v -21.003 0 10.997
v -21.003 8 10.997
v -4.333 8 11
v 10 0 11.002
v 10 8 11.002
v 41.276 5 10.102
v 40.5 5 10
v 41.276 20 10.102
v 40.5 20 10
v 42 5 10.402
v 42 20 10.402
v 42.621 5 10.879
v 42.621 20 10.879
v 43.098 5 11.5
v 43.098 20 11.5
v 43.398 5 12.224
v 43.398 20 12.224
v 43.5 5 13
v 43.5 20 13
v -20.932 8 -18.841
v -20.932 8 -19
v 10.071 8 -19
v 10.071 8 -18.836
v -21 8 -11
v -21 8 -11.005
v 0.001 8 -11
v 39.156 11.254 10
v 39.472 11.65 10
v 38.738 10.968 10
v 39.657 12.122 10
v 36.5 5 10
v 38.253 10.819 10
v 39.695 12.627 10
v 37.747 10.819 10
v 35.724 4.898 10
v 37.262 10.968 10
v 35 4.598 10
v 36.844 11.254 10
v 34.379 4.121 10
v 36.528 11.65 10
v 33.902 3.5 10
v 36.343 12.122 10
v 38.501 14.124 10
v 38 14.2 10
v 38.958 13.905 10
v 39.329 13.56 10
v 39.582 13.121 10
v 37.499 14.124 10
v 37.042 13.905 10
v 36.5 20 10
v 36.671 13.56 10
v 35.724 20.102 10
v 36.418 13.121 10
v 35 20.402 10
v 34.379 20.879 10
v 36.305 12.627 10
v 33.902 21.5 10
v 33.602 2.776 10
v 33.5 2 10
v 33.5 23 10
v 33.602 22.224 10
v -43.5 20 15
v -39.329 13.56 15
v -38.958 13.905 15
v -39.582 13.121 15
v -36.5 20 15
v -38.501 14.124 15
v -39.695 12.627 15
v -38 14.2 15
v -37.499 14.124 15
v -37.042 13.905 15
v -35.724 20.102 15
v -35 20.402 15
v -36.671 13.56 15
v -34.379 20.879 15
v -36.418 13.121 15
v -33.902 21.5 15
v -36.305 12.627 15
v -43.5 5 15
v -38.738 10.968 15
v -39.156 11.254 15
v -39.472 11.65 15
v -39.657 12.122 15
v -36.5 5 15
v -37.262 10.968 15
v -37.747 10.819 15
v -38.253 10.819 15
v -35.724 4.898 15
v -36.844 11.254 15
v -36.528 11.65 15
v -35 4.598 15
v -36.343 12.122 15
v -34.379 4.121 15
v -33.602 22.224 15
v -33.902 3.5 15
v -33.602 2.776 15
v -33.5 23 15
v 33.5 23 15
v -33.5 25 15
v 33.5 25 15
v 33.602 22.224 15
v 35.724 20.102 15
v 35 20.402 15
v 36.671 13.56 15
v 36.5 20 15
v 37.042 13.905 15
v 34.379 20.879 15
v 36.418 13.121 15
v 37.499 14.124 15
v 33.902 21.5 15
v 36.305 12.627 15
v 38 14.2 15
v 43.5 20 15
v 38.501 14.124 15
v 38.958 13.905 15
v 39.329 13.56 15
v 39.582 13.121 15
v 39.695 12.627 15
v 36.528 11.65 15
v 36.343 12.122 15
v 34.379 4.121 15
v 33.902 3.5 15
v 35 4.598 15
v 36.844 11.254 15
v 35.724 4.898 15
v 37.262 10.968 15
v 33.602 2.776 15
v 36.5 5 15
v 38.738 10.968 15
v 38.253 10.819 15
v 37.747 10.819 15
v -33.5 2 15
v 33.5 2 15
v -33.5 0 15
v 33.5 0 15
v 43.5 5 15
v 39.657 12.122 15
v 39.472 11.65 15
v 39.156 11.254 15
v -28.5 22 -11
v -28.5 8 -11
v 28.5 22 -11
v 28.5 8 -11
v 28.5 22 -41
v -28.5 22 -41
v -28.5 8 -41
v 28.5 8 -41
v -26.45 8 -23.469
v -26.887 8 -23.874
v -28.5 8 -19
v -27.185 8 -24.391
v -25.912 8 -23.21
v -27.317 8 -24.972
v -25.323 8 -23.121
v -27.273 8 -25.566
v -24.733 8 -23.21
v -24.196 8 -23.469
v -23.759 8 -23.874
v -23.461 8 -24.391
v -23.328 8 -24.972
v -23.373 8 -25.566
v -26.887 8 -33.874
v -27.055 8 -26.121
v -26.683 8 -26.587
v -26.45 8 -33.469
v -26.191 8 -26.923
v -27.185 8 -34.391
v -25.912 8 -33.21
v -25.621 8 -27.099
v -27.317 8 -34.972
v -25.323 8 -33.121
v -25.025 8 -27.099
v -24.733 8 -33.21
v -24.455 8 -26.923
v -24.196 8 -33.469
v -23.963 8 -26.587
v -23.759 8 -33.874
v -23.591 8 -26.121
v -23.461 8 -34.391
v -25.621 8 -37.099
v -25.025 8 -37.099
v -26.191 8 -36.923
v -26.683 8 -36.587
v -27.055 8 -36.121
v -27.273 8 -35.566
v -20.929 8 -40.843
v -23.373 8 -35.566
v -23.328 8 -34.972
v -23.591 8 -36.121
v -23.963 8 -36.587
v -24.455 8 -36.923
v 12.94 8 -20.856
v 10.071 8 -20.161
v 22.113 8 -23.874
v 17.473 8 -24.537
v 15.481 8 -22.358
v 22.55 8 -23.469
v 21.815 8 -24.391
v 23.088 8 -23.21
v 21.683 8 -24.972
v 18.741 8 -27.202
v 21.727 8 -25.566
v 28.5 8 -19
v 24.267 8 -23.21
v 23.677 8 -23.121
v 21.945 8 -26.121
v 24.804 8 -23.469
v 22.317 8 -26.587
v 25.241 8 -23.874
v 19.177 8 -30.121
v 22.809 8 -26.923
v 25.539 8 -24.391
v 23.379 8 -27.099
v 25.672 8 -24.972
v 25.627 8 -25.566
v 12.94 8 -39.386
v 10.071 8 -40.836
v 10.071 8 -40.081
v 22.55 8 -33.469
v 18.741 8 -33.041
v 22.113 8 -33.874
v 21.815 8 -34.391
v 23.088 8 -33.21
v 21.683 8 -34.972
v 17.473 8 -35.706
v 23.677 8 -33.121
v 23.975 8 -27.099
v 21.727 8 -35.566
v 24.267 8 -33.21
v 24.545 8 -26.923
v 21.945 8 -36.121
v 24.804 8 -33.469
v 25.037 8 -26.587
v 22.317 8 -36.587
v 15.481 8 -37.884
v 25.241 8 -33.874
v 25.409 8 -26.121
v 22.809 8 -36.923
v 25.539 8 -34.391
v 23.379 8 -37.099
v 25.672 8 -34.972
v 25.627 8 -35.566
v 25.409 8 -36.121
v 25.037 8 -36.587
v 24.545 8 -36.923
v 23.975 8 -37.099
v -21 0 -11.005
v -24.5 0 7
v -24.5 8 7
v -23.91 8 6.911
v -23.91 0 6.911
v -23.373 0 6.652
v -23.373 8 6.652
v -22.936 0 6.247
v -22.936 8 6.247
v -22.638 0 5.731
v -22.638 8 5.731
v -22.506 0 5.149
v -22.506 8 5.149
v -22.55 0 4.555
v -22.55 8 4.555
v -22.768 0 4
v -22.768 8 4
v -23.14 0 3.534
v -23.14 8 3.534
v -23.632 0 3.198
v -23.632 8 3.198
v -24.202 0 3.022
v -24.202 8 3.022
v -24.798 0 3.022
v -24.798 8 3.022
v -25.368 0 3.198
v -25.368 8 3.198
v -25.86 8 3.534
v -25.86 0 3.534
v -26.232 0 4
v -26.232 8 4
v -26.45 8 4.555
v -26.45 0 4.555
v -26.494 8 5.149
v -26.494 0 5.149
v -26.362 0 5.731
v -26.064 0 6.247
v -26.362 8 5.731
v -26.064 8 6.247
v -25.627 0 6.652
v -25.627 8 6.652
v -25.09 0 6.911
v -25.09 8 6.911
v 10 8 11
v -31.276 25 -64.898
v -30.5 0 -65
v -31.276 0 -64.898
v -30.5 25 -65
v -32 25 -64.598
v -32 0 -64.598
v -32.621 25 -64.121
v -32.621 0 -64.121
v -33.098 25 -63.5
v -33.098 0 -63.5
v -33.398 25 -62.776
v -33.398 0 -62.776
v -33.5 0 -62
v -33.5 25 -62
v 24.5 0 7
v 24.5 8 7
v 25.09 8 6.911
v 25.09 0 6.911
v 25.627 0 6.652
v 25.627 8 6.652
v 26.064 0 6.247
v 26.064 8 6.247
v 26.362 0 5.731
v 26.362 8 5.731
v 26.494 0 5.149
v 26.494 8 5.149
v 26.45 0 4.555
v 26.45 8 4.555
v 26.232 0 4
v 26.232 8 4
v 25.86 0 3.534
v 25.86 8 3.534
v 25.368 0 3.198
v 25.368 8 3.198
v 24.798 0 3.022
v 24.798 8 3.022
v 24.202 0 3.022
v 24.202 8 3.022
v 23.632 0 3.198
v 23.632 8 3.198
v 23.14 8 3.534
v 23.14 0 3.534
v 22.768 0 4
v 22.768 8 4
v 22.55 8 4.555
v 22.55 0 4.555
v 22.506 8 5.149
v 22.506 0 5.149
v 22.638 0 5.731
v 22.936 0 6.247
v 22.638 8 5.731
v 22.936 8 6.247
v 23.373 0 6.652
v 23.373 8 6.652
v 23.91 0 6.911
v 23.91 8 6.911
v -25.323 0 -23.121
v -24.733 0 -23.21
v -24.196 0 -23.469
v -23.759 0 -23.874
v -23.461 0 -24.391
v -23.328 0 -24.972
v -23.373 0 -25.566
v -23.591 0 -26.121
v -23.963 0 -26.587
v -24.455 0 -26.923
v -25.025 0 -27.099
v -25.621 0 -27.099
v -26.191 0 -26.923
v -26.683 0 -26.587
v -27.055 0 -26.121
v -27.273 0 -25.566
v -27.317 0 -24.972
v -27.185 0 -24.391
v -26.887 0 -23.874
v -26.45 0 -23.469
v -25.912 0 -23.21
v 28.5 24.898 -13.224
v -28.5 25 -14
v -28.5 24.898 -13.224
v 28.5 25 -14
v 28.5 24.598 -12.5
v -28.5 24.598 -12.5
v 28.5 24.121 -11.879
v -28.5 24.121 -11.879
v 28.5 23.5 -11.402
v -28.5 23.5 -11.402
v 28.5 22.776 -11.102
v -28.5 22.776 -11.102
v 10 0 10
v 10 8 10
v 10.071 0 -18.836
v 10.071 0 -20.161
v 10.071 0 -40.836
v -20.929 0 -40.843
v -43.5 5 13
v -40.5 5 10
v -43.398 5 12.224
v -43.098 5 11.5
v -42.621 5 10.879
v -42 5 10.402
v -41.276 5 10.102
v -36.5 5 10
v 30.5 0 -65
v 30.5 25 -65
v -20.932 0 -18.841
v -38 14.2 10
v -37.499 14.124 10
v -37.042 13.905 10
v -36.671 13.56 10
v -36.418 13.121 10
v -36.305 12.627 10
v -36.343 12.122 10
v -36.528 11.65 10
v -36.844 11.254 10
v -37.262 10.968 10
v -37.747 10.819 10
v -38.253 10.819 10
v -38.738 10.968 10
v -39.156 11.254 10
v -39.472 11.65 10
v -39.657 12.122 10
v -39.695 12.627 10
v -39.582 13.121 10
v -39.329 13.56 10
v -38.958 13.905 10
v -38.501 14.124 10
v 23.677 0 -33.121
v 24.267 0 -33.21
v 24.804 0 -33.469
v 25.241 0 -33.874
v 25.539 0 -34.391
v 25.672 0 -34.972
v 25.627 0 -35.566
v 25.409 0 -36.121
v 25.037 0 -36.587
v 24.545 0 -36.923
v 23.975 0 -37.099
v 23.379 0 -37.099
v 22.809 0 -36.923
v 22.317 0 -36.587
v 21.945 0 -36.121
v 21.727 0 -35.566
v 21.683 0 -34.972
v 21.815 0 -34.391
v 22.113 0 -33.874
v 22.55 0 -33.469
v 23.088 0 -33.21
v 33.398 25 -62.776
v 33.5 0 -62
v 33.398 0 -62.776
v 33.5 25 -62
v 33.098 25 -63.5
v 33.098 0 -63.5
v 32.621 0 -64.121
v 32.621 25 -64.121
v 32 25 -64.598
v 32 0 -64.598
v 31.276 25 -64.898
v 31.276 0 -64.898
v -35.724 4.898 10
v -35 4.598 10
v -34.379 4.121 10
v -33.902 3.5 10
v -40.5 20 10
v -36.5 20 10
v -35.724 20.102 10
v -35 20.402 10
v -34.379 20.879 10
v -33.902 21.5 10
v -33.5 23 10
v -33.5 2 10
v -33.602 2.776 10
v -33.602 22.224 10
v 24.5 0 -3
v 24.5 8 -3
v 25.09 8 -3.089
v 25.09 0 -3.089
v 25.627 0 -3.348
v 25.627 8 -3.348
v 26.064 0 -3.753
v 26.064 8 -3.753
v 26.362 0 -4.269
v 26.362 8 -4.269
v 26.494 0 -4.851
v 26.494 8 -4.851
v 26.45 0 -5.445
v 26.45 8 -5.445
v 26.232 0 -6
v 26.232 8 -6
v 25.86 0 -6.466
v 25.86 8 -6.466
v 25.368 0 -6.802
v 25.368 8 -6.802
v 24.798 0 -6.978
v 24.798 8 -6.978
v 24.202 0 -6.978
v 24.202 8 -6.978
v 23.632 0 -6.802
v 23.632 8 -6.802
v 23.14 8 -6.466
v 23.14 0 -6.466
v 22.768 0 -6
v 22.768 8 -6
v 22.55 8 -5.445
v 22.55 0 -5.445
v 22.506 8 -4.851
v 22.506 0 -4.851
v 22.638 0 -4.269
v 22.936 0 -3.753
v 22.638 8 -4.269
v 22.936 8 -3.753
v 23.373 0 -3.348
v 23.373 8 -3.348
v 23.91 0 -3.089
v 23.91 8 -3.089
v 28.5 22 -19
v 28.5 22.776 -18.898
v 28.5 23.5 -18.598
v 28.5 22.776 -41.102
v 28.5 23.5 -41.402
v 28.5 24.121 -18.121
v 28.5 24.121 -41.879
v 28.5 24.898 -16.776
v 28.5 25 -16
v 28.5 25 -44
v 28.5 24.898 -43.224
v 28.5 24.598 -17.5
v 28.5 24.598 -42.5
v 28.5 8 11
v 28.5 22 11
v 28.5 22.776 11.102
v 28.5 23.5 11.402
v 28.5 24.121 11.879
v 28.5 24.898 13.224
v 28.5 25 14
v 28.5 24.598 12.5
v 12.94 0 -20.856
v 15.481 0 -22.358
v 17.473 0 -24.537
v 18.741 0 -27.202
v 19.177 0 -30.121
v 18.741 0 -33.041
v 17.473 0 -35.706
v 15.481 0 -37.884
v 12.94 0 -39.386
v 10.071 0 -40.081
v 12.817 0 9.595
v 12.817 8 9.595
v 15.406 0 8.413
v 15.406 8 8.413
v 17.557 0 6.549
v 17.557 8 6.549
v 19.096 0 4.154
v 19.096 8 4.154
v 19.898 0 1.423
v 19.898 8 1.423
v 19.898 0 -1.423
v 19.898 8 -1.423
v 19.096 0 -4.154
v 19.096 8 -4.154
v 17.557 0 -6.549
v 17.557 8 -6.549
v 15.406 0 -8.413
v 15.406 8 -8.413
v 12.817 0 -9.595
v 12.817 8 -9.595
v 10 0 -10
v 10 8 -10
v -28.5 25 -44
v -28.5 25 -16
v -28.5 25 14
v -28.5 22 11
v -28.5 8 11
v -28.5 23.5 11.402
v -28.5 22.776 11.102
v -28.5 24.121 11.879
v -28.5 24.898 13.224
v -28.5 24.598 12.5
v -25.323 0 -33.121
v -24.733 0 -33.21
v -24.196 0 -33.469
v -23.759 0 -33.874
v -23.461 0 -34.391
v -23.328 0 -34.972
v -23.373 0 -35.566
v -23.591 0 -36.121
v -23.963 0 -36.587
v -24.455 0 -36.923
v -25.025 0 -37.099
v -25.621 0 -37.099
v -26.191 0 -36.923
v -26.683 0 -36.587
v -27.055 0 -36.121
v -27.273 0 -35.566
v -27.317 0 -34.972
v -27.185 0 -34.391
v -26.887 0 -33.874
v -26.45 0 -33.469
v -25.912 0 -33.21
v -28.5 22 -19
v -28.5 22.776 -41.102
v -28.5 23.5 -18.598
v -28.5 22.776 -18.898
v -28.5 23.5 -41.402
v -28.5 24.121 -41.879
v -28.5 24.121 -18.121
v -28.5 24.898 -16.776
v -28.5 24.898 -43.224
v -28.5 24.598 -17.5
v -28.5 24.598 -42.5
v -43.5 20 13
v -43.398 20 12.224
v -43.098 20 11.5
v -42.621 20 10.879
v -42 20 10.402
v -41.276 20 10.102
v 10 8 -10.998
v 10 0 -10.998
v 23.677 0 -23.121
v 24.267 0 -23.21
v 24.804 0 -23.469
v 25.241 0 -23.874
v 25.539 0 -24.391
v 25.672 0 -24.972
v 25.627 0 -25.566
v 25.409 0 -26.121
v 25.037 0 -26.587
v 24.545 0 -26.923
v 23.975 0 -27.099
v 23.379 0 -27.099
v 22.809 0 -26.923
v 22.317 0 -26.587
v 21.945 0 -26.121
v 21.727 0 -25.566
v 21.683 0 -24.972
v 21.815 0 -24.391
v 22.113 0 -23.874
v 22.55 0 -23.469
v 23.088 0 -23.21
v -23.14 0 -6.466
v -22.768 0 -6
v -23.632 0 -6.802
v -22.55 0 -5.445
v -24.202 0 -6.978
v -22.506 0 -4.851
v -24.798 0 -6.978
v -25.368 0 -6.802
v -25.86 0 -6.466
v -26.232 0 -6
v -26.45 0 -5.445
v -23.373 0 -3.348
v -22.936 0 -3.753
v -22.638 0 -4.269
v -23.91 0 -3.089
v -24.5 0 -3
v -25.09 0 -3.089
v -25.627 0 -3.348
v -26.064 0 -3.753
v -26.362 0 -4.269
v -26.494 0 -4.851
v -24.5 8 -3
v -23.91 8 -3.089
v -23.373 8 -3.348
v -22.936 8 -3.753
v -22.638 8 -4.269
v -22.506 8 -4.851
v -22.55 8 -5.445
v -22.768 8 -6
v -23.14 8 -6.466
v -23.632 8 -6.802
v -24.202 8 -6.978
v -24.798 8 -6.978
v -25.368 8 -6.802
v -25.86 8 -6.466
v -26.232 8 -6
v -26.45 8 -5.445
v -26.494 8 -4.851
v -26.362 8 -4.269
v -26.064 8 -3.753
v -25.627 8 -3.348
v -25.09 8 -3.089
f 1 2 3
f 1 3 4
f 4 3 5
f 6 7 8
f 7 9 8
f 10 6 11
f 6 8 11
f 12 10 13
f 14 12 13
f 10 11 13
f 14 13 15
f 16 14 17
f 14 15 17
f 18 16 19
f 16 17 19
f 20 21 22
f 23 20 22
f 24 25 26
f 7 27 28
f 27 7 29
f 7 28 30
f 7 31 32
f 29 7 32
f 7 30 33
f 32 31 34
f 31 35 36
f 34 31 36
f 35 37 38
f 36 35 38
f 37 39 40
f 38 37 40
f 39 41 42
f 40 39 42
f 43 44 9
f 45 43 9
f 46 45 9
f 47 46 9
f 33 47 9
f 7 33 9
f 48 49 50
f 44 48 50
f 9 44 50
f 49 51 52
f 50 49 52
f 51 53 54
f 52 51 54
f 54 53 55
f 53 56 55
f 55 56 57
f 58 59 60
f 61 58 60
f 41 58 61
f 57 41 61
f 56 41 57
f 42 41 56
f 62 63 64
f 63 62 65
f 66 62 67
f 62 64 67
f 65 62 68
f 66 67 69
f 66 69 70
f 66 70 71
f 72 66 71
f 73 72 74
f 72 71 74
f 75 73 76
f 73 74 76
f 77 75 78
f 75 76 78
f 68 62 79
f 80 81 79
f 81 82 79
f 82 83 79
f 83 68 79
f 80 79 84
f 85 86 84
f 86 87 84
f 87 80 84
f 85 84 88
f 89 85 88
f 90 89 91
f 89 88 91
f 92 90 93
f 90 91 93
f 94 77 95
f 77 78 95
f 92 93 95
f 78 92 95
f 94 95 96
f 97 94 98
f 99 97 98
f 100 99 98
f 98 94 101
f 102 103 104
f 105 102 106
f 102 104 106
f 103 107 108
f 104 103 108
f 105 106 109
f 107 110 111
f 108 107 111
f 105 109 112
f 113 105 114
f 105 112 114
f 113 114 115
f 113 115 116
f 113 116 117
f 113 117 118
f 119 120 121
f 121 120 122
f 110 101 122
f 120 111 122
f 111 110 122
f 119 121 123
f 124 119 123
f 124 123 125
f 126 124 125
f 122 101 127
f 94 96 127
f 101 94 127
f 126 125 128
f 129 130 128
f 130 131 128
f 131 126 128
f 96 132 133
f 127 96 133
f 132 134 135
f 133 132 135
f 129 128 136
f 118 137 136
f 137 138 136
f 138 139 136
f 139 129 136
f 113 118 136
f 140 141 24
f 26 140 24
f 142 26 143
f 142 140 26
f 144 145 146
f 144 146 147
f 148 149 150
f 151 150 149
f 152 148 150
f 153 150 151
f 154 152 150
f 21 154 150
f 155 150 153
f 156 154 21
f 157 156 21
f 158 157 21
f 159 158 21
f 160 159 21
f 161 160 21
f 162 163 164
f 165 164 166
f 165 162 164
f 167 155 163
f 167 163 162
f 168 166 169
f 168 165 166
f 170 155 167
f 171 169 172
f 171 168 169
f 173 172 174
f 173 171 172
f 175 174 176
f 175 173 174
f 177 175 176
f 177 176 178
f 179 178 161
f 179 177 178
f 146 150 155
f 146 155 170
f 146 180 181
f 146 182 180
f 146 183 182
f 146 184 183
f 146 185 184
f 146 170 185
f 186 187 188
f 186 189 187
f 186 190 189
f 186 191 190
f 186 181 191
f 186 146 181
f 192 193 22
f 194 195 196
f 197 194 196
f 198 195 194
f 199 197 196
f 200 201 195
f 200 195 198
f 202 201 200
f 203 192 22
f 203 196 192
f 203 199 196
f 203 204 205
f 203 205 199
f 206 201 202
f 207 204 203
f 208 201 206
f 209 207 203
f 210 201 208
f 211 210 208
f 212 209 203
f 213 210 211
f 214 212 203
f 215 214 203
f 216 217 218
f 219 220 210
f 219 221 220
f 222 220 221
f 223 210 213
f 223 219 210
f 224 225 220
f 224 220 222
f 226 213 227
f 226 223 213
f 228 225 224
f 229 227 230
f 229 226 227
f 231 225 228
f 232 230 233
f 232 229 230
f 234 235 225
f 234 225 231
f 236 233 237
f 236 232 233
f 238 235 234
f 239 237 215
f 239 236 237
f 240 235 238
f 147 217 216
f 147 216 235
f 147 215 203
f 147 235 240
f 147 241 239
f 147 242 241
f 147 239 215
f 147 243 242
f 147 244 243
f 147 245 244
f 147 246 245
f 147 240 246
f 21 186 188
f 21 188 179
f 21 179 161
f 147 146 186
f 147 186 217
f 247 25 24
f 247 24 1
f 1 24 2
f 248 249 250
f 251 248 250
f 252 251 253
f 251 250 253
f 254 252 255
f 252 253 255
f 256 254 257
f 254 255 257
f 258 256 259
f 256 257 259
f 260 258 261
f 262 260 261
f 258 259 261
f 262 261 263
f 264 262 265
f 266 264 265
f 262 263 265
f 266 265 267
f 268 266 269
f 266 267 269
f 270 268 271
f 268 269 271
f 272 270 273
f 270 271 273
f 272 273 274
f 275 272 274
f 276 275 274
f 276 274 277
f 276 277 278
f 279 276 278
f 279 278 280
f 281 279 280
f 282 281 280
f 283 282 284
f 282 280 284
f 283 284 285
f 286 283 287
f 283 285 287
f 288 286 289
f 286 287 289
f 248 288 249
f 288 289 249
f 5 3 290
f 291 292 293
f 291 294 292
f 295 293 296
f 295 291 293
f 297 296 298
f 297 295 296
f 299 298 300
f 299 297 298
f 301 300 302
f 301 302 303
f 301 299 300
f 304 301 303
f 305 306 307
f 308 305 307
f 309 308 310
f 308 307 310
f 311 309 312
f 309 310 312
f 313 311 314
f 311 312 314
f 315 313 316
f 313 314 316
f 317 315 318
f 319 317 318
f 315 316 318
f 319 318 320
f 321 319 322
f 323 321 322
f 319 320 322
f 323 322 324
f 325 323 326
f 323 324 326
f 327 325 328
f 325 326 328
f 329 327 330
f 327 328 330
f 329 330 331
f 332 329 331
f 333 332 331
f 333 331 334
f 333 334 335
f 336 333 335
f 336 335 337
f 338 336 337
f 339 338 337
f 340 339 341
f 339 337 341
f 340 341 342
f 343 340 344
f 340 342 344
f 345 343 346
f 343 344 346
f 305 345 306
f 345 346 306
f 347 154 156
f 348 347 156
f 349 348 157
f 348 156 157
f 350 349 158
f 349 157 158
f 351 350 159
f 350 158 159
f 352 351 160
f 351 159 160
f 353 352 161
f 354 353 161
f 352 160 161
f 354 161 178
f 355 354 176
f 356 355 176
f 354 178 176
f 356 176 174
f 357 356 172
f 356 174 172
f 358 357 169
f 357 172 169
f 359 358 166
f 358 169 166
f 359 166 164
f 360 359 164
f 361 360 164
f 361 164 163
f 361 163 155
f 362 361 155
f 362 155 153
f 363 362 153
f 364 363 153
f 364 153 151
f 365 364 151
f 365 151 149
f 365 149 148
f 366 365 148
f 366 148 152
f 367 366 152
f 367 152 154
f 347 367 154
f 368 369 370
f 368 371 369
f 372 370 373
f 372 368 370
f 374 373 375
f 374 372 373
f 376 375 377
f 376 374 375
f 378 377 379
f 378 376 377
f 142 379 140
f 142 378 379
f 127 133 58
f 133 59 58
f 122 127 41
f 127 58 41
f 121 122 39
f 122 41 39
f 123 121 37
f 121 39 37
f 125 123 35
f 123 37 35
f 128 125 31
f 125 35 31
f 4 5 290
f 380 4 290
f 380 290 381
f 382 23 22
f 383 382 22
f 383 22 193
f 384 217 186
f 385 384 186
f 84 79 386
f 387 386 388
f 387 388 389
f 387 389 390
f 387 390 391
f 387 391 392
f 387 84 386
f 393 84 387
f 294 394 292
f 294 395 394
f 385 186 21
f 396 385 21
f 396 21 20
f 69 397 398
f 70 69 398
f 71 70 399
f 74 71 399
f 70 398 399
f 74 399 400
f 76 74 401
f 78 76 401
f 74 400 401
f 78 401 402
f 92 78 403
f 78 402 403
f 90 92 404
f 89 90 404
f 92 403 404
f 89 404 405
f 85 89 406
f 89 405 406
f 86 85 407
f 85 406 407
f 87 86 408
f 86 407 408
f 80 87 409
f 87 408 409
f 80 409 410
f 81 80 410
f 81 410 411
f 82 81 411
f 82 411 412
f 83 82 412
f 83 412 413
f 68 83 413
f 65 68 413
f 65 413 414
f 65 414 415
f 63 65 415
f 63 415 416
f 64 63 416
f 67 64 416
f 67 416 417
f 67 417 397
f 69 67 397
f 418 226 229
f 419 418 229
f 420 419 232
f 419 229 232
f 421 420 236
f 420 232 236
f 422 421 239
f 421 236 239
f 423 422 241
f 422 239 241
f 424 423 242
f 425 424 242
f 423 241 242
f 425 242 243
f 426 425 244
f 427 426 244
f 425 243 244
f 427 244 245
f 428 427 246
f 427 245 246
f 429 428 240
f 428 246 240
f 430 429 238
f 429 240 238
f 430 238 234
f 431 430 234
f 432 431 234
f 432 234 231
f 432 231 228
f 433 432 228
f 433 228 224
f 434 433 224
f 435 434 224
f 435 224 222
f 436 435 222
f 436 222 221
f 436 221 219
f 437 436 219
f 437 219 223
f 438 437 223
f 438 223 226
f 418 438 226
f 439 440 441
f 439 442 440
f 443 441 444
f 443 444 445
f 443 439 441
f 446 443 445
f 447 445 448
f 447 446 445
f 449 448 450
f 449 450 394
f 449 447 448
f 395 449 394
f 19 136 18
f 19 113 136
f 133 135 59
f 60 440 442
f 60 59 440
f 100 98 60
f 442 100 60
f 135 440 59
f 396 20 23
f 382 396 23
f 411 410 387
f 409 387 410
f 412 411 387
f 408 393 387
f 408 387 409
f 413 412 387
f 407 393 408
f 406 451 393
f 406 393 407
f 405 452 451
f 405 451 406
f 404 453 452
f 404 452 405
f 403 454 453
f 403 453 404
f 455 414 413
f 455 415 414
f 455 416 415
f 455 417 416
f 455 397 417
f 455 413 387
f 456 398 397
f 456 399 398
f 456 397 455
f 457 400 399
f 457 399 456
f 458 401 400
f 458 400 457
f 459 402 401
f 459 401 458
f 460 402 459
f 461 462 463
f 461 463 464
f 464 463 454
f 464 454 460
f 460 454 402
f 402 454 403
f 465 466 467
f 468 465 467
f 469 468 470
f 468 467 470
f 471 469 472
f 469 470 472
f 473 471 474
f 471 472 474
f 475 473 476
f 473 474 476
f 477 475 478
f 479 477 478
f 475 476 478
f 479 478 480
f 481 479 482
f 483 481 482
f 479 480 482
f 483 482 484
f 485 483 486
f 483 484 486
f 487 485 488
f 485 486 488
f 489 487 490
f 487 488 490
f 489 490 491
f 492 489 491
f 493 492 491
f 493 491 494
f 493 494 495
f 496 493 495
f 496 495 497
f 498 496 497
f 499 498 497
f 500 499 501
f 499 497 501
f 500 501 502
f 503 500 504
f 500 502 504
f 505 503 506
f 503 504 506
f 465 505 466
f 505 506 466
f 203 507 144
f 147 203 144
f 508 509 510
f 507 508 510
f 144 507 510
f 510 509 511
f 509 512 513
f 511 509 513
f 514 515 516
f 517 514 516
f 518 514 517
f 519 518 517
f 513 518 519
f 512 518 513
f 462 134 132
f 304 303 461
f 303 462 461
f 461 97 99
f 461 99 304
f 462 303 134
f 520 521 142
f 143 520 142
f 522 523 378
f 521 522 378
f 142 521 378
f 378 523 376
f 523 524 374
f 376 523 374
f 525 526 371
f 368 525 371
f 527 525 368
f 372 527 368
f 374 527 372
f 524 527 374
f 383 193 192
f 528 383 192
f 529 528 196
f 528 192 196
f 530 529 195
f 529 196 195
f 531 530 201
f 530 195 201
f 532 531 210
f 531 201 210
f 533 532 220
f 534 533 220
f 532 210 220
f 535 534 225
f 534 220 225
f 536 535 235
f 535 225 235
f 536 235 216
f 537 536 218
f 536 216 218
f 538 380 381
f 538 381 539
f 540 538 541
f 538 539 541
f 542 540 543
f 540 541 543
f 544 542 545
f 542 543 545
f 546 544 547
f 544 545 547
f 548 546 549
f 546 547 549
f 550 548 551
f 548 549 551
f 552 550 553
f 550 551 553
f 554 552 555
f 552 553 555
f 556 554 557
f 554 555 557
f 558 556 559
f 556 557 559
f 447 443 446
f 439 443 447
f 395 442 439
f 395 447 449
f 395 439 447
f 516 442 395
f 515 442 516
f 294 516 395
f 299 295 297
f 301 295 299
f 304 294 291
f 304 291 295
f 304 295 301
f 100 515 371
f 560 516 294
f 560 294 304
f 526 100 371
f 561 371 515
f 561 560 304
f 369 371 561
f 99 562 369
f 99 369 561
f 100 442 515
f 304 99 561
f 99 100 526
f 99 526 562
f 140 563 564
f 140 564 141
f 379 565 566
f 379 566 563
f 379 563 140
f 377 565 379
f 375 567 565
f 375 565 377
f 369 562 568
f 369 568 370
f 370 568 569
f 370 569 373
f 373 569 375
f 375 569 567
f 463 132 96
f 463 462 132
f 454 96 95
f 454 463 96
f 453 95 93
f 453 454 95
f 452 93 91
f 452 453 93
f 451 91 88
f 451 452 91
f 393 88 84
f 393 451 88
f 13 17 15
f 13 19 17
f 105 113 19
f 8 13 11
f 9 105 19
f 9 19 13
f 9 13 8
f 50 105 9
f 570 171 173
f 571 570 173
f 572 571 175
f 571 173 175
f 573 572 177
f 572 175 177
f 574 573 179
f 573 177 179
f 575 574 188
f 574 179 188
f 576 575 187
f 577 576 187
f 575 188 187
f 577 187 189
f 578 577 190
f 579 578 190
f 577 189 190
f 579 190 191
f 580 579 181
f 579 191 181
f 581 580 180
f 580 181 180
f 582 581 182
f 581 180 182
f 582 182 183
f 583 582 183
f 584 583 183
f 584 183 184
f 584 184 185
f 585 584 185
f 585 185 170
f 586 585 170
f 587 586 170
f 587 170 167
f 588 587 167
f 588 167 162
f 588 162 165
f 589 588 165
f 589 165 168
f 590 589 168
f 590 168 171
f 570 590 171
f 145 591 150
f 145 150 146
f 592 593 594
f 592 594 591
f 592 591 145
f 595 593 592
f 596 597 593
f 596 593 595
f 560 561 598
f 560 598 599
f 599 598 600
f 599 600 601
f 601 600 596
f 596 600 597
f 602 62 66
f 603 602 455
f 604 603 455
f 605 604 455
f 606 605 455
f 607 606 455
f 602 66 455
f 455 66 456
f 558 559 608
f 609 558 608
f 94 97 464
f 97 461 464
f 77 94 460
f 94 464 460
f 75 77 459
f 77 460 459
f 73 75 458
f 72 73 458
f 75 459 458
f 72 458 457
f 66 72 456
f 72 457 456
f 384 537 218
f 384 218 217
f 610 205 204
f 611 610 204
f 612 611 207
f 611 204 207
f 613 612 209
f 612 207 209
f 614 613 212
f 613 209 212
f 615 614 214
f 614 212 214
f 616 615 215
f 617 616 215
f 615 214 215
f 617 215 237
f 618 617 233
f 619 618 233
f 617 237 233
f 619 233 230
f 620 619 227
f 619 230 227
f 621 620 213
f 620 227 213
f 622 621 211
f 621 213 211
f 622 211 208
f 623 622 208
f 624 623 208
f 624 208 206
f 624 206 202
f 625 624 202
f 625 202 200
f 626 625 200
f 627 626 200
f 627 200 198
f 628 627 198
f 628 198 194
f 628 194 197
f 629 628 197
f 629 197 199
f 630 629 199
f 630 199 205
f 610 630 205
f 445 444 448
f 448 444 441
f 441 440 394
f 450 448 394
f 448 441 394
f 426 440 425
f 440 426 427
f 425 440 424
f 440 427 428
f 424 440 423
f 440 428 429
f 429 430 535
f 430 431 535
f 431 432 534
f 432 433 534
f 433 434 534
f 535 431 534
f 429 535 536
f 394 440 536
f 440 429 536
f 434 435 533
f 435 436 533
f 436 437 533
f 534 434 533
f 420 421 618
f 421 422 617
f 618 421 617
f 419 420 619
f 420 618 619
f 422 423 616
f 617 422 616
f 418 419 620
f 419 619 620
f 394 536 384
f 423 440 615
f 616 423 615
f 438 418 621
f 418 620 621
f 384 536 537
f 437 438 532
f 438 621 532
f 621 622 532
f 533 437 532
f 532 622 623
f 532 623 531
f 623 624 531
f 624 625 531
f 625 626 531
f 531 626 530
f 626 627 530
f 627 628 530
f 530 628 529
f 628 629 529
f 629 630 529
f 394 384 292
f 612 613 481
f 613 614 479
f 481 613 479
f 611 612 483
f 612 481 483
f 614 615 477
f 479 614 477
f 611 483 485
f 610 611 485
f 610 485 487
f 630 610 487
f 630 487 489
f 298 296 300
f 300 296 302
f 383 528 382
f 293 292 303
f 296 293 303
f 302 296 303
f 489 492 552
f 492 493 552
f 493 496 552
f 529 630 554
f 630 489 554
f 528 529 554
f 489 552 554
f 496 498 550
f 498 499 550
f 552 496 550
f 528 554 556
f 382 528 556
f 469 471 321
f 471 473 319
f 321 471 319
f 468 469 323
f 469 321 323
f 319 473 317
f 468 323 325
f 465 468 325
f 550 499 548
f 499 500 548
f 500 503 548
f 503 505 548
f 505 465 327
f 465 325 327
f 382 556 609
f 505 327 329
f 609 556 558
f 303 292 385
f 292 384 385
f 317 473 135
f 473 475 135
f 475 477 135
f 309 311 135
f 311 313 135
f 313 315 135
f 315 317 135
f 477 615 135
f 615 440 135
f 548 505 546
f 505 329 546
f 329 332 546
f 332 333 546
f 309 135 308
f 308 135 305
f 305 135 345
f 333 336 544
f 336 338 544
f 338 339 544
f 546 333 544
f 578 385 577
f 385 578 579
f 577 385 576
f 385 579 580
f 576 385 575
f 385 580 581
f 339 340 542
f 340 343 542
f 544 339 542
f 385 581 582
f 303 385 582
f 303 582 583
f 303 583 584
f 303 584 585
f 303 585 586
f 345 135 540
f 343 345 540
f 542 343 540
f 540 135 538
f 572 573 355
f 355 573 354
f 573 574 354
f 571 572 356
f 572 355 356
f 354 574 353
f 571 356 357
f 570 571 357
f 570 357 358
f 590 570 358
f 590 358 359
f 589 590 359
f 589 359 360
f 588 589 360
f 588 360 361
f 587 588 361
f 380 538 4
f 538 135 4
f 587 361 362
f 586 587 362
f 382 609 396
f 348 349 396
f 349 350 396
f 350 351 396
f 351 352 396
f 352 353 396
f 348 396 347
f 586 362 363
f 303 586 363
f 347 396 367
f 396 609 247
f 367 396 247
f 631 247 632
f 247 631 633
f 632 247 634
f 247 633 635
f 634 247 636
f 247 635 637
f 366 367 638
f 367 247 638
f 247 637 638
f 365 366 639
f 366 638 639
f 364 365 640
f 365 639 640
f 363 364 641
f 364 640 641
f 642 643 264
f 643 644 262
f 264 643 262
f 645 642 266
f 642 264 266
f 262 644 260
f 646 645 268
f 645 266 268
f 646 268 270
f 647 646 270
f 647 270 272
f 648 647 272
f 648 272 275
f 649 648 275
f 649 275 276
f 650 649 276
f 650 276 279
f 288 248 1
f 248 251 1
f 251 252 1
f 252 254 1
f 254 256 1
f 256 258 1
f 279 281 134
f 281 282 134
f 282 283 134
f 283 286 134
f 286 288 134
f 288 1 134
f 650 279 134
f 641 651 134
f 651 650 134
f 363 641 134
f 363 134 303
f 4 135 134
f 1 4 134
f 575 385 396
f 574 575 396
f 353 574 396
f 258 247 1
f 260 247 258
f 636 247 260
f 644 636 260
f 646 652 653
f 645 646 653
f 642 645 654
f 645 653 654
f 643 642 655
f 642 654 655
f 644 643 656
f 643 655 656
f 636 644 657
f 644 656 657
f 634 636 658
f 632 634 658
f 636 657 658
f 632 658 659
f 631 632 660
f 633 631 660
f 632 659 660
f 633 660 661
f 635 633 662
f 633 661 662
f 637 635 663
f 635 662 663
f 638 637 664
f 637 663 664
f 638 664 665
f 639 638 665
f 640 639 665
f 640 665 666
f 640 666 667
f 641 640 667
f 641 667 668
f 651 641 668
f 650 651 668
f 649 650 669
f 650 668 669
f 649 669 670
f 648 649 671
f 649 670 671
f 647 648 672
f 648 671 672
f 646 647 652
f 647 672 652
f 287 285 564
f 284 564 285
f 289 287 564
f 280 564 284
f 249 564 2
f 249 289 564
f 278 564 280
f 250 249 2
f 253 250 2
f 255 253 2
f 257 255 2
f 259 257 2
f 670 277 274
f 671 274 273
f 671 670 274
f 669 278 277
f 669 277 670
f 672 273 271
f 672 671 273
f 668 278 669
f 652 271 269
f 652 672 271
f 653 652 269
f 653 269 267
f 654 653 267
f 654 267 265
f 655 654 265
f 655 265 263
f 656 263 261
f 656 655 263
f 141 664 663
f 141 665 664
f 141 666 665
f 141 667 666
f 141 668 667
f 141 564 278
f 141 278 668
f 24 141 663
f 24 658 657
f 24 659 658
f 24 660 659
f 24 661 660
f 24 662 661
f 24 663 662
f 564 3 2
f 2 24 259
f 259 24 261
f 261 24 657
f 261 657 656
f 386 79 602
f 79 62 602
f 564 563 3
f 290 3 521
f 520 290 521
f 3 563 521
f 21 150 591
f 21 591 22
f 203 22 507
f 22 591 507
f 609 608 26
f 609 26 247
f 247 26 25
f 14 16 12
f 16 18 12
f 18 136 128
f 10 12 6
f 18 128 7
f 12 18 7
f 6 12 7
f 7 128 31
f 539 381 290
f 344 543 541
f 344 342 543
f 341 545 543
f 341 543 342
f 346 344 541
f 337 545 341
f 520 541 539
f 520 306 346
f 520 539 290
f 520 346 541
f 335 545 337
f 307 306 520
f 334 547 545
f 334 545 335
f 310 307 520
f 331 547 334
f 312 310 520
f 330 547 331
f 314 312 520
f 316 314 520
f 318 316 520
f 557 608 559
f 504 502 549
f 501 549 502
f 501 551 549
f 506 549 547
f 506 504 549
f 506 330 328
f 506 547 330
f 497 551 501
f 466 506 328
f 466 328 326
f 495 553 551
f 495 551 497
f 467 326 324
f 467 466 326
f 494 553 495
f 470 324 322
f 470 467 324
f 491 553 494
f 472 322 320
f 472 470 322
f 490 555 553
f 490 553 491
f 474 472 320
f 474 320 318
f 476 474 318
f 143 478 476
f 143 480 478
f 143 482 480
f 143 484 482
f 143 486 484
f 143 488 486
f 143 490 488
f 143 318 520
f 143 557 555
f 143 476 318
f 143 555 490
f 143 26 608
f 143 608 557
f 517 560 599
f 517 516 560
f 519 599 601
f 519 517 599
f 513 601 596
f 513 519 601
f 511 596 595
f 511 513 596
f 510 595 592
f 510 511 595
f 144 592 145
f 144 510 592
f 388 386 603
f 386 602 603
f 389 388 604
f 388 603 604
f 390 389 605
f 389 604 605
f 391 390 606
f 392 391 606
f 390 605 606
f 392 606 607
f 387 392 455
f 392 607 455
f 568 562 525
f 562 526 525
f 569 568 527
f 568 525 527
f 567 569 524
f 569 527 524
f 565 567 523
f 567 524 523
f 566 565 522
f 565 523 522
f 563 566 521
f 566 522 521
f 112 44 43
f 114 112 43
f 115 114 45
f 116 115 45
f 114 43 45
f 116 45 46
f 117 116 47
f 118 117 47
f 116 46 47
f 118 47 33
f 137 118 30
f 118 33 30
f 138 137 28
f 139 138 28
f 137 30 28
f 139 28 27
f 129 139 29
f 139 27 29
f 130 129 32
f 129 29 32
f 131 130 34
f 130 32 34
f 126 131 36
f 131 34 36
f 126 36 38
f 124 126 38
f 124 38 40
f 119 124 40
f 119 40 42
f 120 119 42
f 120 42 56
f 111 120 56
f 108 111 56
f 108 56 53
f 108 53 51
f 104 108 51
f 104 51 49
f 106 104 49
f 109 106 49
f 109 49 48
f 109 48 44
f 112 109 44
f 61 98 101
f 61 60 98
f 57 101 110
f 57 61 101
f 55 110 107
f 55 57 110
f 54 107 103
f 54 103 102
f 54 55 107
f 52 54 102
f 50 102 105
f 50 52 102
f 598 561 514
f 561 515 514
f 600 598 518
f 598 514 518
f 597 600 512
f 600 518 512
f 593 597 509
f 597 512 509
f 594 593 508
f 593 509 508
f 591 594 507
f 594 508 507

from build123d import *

# Parameters (mm, degrees)
SKETCH1_W           = 67
SKETCH1_H           = 30
BOSS_EXTRUDE1_DEPTH = 25
SKETCH2_W           = 57
SKETCH2_H           = 22
CUT_EXTRUDE1_DEPTH  = 17
SKETCH3_R           = 10
SKETCH3_R_2         = 8
SKETCH3_R_3         = 2
CUT_EXTRUDE2_DEPTH  = 8
BOSS_EXTRUDE2_START = -67
SKETCH4_W           = 5
SKETCH4_H           = 15
BOSS_EXTRUDE2_DEPTH = 10
SKETCH4_2_W         = 5
SKETCH4_2_H         = 15
BOSS_EXTRUDE3_DEPTH = 10
SKETCH5_R           = 1.7
CUT_EXTRUDE3_DEPTH  = 10
CUT_EXTRUDE4_DEPTH  = 8
SKETCH8_W           = 67
SKETCH8_H           = 25
BOSS_EXTRUDE4_DEPTH = 50
SKETCH9_W           = 57
SKETCH9_H           = 22
CUT_EXTRUDE6_DEPTH  = 17
SKETCH11_R          = 10
SKETCH11_R_2        = 8
SKETCH11_R_3        = 2
CUT_EXTRUDE7_DEPTH  = 81.039052968
CUT_EXTRUDE8_DEPTH  = 81.039052968
FILLET1_R           = 3


with BuildPart() as part:
    # Sketch1 → Boss-Extrude1 (new body)
    with BuildSketch(Plane(origin=(0, 0, 0), x_dir=(1, 0, 0), z_dir=(0, 1, 0))):
        Rectangle(SKETCH1_W, SKETCH1_H)
    extrude(amount=BOSS_EXTRUDE1_DEPTH)

    # Sketch2 → Cut-Extrude1 (cut)
    with BuildSketch(Plane(origin=(0, 25, 0), x_dir=(1, 0, 0), z_dir=(0, 1, 0))):
        Rectangle(SKETCH2_W, SKETCH2_H)
    extrude(amount=-CUT_EXTRUDE1_DEPTH, mode=Mode.SUBTRACT)

    # Sketch3 → Cut-Extrude2 (cut)
    with BuildSketch(Plane(origin=(0, 8, 0), x_dir=(1, 0, 0), z_dir=(0, 1, 0))):
        with Locations((10, 0)):
            Circle(SKETCH3_R)
        with Locations((-3, 0)):
            Circle(SKETCH3_R_2)
        with Locations(Location((-24.5, 5, 0), (0, 0, 270))):
            Circle(SKETCH3_R_3)
        with Locations(Location((-24.5, -5, 0), (0, 0, 270))):
            Circle(SKETCH3_R_3)
        with Locations(Location((24.5, 5, 0), (0, 0, 270))):
            Circle(SKETCH3_R_3)
        with Locations(Location((24.5, -5, 0), (0, 0, 270))):
            Circle(SKETCH3_R_3)
    extrude(amount=-CUT_EXTRUDE2_DEPTH, mode=Mode.SUBTRACT)

    # Sketch4 → Boss-Extrude2 (add)
    with BuildSketch(Plane(origin=(33.5, 0, 0), x_dir=(0, 0, -1), z_dir=(1, 0, 0)).offset(BOSS_EXTRUDE2_START)):
        with Locations((-12.5, 12.5)):
            Rectangle(SKETCH4_W, SKETCH4_H)
    extrude(amount=-BOSS_EXTRUDE2_DEPTH)

    # Sketch4<2> → Boss-Extrude3 (add)
    with BuildSketch(Plane(origin=(33.5, 0, 0), x_dir=(0, 0, -1), z_dir=(1, 0, 0))):
        with Locations((-12.5, 12.5)):
            Rectangle(SKETCH4_2_W, SKETCH4_2_H)
    extrude(amount=BOSS_EXTRUDE3_DEPTH)

    # Sketch5 → Cut-Extrude3 (cut)
    with BuildSketch(Plane(origin=(0, 0, 10), x_dir=(-1, 0, 0), z_dir=(0, 0, -1))):
        with Locations(Location((38, 12.5, 0), (0, 0, 90))):
            Circle(SKETCH5_R)
        with Locations(Location((-38, 12.5, 0), (0, 0, 90))):
            Circle(SKETCH5_R)
    extrude(amount=-CUT_EXTRUDE3_DEPTH, mode=Mode.SUBTRACT)

    # Sketch6 → Cut-Extrude4 (cut)
    with BuildSketch(Plane(origin=(0, 8, 0), x_dir=(1, 0, 0), z_dir=(0, 1, 0))):
        Polygon((-21, 11.00455557), (-21.003329437, -10.997477388), (10, -11.002168937), (10, 10.997831063), align=None)
    extrude(amount=-CUT_EXTRUDE4_DEPTH, mode=Mode.SUBTRACT)

    # Sketch8 → Boss-Extrude4 (add)
    with BuildSketch(Plane(origin=(0, 0, -15), x_dir=(-1, 0, 0), z_dir=(0, 0, -1))):
        with Locations((0, 12.5)):
            Rectangle(SKETCH8_W, SKETCH8_H)
    extrude(amount=BOSS_EXTRUDE4_DEPTH)

    # Sketch9 → Cut-Extrude6 (cut)
    with BuildSketch(Plane(origin=(0, 25, 0), x_dir=(1, 0, 0), z_dir=(0, 1, 0))):
        with Locations((0, 30)):
            Rectangle(SKETCH9_W, SKETCH9_H)
    extrude(amount=-CUT_EXTRUDE6_DEPTH, mode=Mode.SUBTRACT)

    # Sketch11 → Cut-Extrude7 (cut, through all)
    with BuildSketch(Plane(origin=(0, 8, 0), x_dir=(1, 0, 0), z_dir=(0, 1, 0))):
        with Locations((9.177125898, 30.121191818)):
            Circle(SKETCH11_R)
        with Locations((-3.822874102, 30.121191818)):
            Circle(SKETCH11_R_2)
        with Locations(Location((-25.322874102, 35.121191818, 0), (0, 0, 270))):
            Circle(SKETCH11_R_3)
        with Locations(Location((-25.322874102, 25.121191818, 0), (0, 0, 270))):
            Circle(SKETCH11_R_3)
        with Locations(Location((23.677125898, 35.121191818, 0), (0, 0, 270))):
            Circle(SKETCH11_R_3)
        with Locations(Location((23.677125898, 25.121191818, 0), (0, 0, 270))):
            Circle(SKETCH11_R_3)
    extrude(amount=-CUT_EXTRUDE7_DEPTH, mode=Mode.SUBTRACT)

    # Sketch13 → Cut-Extrude8 (cut, through all)
    with BuildSketch(Plane(origin=(0, 8, 0), x_dir=(1, 0, 0), z_dir=(0, 1, 0))):
        Polygon((-20.928820676, 40.842619331), (-20.932150113, 18.840586374), (10.071179324, 18.835894824), (10.071179324, 40.835894824), align=None)
    extrude(amount=-CUT_EXTRUDE8_DEPTH, mode=Mode.SUBTRACT)

    # Fillet1
    fillet1_edges = [part.edges().sort_by_distance(p)[0] for p in [
        (0, 25, -41),
        (0, 25, -19),
        (0, 25, 11),
        (-43.5, 12.5, 10),
        (-33.5, 20, 12.5),
        (-33.5, 5, 12.5),
        (0, 25, -11),
        (33.5, 20, 12.5),
        (33.5, 5, 12.5),
        (43.5, 12.5, 10),
        (33.5, 12.5, -65),
        (-33.5, 12.5, -65),
    ]]
    fillet(fillet1_edges, radius=FILLET1_R)


solid = part.part
